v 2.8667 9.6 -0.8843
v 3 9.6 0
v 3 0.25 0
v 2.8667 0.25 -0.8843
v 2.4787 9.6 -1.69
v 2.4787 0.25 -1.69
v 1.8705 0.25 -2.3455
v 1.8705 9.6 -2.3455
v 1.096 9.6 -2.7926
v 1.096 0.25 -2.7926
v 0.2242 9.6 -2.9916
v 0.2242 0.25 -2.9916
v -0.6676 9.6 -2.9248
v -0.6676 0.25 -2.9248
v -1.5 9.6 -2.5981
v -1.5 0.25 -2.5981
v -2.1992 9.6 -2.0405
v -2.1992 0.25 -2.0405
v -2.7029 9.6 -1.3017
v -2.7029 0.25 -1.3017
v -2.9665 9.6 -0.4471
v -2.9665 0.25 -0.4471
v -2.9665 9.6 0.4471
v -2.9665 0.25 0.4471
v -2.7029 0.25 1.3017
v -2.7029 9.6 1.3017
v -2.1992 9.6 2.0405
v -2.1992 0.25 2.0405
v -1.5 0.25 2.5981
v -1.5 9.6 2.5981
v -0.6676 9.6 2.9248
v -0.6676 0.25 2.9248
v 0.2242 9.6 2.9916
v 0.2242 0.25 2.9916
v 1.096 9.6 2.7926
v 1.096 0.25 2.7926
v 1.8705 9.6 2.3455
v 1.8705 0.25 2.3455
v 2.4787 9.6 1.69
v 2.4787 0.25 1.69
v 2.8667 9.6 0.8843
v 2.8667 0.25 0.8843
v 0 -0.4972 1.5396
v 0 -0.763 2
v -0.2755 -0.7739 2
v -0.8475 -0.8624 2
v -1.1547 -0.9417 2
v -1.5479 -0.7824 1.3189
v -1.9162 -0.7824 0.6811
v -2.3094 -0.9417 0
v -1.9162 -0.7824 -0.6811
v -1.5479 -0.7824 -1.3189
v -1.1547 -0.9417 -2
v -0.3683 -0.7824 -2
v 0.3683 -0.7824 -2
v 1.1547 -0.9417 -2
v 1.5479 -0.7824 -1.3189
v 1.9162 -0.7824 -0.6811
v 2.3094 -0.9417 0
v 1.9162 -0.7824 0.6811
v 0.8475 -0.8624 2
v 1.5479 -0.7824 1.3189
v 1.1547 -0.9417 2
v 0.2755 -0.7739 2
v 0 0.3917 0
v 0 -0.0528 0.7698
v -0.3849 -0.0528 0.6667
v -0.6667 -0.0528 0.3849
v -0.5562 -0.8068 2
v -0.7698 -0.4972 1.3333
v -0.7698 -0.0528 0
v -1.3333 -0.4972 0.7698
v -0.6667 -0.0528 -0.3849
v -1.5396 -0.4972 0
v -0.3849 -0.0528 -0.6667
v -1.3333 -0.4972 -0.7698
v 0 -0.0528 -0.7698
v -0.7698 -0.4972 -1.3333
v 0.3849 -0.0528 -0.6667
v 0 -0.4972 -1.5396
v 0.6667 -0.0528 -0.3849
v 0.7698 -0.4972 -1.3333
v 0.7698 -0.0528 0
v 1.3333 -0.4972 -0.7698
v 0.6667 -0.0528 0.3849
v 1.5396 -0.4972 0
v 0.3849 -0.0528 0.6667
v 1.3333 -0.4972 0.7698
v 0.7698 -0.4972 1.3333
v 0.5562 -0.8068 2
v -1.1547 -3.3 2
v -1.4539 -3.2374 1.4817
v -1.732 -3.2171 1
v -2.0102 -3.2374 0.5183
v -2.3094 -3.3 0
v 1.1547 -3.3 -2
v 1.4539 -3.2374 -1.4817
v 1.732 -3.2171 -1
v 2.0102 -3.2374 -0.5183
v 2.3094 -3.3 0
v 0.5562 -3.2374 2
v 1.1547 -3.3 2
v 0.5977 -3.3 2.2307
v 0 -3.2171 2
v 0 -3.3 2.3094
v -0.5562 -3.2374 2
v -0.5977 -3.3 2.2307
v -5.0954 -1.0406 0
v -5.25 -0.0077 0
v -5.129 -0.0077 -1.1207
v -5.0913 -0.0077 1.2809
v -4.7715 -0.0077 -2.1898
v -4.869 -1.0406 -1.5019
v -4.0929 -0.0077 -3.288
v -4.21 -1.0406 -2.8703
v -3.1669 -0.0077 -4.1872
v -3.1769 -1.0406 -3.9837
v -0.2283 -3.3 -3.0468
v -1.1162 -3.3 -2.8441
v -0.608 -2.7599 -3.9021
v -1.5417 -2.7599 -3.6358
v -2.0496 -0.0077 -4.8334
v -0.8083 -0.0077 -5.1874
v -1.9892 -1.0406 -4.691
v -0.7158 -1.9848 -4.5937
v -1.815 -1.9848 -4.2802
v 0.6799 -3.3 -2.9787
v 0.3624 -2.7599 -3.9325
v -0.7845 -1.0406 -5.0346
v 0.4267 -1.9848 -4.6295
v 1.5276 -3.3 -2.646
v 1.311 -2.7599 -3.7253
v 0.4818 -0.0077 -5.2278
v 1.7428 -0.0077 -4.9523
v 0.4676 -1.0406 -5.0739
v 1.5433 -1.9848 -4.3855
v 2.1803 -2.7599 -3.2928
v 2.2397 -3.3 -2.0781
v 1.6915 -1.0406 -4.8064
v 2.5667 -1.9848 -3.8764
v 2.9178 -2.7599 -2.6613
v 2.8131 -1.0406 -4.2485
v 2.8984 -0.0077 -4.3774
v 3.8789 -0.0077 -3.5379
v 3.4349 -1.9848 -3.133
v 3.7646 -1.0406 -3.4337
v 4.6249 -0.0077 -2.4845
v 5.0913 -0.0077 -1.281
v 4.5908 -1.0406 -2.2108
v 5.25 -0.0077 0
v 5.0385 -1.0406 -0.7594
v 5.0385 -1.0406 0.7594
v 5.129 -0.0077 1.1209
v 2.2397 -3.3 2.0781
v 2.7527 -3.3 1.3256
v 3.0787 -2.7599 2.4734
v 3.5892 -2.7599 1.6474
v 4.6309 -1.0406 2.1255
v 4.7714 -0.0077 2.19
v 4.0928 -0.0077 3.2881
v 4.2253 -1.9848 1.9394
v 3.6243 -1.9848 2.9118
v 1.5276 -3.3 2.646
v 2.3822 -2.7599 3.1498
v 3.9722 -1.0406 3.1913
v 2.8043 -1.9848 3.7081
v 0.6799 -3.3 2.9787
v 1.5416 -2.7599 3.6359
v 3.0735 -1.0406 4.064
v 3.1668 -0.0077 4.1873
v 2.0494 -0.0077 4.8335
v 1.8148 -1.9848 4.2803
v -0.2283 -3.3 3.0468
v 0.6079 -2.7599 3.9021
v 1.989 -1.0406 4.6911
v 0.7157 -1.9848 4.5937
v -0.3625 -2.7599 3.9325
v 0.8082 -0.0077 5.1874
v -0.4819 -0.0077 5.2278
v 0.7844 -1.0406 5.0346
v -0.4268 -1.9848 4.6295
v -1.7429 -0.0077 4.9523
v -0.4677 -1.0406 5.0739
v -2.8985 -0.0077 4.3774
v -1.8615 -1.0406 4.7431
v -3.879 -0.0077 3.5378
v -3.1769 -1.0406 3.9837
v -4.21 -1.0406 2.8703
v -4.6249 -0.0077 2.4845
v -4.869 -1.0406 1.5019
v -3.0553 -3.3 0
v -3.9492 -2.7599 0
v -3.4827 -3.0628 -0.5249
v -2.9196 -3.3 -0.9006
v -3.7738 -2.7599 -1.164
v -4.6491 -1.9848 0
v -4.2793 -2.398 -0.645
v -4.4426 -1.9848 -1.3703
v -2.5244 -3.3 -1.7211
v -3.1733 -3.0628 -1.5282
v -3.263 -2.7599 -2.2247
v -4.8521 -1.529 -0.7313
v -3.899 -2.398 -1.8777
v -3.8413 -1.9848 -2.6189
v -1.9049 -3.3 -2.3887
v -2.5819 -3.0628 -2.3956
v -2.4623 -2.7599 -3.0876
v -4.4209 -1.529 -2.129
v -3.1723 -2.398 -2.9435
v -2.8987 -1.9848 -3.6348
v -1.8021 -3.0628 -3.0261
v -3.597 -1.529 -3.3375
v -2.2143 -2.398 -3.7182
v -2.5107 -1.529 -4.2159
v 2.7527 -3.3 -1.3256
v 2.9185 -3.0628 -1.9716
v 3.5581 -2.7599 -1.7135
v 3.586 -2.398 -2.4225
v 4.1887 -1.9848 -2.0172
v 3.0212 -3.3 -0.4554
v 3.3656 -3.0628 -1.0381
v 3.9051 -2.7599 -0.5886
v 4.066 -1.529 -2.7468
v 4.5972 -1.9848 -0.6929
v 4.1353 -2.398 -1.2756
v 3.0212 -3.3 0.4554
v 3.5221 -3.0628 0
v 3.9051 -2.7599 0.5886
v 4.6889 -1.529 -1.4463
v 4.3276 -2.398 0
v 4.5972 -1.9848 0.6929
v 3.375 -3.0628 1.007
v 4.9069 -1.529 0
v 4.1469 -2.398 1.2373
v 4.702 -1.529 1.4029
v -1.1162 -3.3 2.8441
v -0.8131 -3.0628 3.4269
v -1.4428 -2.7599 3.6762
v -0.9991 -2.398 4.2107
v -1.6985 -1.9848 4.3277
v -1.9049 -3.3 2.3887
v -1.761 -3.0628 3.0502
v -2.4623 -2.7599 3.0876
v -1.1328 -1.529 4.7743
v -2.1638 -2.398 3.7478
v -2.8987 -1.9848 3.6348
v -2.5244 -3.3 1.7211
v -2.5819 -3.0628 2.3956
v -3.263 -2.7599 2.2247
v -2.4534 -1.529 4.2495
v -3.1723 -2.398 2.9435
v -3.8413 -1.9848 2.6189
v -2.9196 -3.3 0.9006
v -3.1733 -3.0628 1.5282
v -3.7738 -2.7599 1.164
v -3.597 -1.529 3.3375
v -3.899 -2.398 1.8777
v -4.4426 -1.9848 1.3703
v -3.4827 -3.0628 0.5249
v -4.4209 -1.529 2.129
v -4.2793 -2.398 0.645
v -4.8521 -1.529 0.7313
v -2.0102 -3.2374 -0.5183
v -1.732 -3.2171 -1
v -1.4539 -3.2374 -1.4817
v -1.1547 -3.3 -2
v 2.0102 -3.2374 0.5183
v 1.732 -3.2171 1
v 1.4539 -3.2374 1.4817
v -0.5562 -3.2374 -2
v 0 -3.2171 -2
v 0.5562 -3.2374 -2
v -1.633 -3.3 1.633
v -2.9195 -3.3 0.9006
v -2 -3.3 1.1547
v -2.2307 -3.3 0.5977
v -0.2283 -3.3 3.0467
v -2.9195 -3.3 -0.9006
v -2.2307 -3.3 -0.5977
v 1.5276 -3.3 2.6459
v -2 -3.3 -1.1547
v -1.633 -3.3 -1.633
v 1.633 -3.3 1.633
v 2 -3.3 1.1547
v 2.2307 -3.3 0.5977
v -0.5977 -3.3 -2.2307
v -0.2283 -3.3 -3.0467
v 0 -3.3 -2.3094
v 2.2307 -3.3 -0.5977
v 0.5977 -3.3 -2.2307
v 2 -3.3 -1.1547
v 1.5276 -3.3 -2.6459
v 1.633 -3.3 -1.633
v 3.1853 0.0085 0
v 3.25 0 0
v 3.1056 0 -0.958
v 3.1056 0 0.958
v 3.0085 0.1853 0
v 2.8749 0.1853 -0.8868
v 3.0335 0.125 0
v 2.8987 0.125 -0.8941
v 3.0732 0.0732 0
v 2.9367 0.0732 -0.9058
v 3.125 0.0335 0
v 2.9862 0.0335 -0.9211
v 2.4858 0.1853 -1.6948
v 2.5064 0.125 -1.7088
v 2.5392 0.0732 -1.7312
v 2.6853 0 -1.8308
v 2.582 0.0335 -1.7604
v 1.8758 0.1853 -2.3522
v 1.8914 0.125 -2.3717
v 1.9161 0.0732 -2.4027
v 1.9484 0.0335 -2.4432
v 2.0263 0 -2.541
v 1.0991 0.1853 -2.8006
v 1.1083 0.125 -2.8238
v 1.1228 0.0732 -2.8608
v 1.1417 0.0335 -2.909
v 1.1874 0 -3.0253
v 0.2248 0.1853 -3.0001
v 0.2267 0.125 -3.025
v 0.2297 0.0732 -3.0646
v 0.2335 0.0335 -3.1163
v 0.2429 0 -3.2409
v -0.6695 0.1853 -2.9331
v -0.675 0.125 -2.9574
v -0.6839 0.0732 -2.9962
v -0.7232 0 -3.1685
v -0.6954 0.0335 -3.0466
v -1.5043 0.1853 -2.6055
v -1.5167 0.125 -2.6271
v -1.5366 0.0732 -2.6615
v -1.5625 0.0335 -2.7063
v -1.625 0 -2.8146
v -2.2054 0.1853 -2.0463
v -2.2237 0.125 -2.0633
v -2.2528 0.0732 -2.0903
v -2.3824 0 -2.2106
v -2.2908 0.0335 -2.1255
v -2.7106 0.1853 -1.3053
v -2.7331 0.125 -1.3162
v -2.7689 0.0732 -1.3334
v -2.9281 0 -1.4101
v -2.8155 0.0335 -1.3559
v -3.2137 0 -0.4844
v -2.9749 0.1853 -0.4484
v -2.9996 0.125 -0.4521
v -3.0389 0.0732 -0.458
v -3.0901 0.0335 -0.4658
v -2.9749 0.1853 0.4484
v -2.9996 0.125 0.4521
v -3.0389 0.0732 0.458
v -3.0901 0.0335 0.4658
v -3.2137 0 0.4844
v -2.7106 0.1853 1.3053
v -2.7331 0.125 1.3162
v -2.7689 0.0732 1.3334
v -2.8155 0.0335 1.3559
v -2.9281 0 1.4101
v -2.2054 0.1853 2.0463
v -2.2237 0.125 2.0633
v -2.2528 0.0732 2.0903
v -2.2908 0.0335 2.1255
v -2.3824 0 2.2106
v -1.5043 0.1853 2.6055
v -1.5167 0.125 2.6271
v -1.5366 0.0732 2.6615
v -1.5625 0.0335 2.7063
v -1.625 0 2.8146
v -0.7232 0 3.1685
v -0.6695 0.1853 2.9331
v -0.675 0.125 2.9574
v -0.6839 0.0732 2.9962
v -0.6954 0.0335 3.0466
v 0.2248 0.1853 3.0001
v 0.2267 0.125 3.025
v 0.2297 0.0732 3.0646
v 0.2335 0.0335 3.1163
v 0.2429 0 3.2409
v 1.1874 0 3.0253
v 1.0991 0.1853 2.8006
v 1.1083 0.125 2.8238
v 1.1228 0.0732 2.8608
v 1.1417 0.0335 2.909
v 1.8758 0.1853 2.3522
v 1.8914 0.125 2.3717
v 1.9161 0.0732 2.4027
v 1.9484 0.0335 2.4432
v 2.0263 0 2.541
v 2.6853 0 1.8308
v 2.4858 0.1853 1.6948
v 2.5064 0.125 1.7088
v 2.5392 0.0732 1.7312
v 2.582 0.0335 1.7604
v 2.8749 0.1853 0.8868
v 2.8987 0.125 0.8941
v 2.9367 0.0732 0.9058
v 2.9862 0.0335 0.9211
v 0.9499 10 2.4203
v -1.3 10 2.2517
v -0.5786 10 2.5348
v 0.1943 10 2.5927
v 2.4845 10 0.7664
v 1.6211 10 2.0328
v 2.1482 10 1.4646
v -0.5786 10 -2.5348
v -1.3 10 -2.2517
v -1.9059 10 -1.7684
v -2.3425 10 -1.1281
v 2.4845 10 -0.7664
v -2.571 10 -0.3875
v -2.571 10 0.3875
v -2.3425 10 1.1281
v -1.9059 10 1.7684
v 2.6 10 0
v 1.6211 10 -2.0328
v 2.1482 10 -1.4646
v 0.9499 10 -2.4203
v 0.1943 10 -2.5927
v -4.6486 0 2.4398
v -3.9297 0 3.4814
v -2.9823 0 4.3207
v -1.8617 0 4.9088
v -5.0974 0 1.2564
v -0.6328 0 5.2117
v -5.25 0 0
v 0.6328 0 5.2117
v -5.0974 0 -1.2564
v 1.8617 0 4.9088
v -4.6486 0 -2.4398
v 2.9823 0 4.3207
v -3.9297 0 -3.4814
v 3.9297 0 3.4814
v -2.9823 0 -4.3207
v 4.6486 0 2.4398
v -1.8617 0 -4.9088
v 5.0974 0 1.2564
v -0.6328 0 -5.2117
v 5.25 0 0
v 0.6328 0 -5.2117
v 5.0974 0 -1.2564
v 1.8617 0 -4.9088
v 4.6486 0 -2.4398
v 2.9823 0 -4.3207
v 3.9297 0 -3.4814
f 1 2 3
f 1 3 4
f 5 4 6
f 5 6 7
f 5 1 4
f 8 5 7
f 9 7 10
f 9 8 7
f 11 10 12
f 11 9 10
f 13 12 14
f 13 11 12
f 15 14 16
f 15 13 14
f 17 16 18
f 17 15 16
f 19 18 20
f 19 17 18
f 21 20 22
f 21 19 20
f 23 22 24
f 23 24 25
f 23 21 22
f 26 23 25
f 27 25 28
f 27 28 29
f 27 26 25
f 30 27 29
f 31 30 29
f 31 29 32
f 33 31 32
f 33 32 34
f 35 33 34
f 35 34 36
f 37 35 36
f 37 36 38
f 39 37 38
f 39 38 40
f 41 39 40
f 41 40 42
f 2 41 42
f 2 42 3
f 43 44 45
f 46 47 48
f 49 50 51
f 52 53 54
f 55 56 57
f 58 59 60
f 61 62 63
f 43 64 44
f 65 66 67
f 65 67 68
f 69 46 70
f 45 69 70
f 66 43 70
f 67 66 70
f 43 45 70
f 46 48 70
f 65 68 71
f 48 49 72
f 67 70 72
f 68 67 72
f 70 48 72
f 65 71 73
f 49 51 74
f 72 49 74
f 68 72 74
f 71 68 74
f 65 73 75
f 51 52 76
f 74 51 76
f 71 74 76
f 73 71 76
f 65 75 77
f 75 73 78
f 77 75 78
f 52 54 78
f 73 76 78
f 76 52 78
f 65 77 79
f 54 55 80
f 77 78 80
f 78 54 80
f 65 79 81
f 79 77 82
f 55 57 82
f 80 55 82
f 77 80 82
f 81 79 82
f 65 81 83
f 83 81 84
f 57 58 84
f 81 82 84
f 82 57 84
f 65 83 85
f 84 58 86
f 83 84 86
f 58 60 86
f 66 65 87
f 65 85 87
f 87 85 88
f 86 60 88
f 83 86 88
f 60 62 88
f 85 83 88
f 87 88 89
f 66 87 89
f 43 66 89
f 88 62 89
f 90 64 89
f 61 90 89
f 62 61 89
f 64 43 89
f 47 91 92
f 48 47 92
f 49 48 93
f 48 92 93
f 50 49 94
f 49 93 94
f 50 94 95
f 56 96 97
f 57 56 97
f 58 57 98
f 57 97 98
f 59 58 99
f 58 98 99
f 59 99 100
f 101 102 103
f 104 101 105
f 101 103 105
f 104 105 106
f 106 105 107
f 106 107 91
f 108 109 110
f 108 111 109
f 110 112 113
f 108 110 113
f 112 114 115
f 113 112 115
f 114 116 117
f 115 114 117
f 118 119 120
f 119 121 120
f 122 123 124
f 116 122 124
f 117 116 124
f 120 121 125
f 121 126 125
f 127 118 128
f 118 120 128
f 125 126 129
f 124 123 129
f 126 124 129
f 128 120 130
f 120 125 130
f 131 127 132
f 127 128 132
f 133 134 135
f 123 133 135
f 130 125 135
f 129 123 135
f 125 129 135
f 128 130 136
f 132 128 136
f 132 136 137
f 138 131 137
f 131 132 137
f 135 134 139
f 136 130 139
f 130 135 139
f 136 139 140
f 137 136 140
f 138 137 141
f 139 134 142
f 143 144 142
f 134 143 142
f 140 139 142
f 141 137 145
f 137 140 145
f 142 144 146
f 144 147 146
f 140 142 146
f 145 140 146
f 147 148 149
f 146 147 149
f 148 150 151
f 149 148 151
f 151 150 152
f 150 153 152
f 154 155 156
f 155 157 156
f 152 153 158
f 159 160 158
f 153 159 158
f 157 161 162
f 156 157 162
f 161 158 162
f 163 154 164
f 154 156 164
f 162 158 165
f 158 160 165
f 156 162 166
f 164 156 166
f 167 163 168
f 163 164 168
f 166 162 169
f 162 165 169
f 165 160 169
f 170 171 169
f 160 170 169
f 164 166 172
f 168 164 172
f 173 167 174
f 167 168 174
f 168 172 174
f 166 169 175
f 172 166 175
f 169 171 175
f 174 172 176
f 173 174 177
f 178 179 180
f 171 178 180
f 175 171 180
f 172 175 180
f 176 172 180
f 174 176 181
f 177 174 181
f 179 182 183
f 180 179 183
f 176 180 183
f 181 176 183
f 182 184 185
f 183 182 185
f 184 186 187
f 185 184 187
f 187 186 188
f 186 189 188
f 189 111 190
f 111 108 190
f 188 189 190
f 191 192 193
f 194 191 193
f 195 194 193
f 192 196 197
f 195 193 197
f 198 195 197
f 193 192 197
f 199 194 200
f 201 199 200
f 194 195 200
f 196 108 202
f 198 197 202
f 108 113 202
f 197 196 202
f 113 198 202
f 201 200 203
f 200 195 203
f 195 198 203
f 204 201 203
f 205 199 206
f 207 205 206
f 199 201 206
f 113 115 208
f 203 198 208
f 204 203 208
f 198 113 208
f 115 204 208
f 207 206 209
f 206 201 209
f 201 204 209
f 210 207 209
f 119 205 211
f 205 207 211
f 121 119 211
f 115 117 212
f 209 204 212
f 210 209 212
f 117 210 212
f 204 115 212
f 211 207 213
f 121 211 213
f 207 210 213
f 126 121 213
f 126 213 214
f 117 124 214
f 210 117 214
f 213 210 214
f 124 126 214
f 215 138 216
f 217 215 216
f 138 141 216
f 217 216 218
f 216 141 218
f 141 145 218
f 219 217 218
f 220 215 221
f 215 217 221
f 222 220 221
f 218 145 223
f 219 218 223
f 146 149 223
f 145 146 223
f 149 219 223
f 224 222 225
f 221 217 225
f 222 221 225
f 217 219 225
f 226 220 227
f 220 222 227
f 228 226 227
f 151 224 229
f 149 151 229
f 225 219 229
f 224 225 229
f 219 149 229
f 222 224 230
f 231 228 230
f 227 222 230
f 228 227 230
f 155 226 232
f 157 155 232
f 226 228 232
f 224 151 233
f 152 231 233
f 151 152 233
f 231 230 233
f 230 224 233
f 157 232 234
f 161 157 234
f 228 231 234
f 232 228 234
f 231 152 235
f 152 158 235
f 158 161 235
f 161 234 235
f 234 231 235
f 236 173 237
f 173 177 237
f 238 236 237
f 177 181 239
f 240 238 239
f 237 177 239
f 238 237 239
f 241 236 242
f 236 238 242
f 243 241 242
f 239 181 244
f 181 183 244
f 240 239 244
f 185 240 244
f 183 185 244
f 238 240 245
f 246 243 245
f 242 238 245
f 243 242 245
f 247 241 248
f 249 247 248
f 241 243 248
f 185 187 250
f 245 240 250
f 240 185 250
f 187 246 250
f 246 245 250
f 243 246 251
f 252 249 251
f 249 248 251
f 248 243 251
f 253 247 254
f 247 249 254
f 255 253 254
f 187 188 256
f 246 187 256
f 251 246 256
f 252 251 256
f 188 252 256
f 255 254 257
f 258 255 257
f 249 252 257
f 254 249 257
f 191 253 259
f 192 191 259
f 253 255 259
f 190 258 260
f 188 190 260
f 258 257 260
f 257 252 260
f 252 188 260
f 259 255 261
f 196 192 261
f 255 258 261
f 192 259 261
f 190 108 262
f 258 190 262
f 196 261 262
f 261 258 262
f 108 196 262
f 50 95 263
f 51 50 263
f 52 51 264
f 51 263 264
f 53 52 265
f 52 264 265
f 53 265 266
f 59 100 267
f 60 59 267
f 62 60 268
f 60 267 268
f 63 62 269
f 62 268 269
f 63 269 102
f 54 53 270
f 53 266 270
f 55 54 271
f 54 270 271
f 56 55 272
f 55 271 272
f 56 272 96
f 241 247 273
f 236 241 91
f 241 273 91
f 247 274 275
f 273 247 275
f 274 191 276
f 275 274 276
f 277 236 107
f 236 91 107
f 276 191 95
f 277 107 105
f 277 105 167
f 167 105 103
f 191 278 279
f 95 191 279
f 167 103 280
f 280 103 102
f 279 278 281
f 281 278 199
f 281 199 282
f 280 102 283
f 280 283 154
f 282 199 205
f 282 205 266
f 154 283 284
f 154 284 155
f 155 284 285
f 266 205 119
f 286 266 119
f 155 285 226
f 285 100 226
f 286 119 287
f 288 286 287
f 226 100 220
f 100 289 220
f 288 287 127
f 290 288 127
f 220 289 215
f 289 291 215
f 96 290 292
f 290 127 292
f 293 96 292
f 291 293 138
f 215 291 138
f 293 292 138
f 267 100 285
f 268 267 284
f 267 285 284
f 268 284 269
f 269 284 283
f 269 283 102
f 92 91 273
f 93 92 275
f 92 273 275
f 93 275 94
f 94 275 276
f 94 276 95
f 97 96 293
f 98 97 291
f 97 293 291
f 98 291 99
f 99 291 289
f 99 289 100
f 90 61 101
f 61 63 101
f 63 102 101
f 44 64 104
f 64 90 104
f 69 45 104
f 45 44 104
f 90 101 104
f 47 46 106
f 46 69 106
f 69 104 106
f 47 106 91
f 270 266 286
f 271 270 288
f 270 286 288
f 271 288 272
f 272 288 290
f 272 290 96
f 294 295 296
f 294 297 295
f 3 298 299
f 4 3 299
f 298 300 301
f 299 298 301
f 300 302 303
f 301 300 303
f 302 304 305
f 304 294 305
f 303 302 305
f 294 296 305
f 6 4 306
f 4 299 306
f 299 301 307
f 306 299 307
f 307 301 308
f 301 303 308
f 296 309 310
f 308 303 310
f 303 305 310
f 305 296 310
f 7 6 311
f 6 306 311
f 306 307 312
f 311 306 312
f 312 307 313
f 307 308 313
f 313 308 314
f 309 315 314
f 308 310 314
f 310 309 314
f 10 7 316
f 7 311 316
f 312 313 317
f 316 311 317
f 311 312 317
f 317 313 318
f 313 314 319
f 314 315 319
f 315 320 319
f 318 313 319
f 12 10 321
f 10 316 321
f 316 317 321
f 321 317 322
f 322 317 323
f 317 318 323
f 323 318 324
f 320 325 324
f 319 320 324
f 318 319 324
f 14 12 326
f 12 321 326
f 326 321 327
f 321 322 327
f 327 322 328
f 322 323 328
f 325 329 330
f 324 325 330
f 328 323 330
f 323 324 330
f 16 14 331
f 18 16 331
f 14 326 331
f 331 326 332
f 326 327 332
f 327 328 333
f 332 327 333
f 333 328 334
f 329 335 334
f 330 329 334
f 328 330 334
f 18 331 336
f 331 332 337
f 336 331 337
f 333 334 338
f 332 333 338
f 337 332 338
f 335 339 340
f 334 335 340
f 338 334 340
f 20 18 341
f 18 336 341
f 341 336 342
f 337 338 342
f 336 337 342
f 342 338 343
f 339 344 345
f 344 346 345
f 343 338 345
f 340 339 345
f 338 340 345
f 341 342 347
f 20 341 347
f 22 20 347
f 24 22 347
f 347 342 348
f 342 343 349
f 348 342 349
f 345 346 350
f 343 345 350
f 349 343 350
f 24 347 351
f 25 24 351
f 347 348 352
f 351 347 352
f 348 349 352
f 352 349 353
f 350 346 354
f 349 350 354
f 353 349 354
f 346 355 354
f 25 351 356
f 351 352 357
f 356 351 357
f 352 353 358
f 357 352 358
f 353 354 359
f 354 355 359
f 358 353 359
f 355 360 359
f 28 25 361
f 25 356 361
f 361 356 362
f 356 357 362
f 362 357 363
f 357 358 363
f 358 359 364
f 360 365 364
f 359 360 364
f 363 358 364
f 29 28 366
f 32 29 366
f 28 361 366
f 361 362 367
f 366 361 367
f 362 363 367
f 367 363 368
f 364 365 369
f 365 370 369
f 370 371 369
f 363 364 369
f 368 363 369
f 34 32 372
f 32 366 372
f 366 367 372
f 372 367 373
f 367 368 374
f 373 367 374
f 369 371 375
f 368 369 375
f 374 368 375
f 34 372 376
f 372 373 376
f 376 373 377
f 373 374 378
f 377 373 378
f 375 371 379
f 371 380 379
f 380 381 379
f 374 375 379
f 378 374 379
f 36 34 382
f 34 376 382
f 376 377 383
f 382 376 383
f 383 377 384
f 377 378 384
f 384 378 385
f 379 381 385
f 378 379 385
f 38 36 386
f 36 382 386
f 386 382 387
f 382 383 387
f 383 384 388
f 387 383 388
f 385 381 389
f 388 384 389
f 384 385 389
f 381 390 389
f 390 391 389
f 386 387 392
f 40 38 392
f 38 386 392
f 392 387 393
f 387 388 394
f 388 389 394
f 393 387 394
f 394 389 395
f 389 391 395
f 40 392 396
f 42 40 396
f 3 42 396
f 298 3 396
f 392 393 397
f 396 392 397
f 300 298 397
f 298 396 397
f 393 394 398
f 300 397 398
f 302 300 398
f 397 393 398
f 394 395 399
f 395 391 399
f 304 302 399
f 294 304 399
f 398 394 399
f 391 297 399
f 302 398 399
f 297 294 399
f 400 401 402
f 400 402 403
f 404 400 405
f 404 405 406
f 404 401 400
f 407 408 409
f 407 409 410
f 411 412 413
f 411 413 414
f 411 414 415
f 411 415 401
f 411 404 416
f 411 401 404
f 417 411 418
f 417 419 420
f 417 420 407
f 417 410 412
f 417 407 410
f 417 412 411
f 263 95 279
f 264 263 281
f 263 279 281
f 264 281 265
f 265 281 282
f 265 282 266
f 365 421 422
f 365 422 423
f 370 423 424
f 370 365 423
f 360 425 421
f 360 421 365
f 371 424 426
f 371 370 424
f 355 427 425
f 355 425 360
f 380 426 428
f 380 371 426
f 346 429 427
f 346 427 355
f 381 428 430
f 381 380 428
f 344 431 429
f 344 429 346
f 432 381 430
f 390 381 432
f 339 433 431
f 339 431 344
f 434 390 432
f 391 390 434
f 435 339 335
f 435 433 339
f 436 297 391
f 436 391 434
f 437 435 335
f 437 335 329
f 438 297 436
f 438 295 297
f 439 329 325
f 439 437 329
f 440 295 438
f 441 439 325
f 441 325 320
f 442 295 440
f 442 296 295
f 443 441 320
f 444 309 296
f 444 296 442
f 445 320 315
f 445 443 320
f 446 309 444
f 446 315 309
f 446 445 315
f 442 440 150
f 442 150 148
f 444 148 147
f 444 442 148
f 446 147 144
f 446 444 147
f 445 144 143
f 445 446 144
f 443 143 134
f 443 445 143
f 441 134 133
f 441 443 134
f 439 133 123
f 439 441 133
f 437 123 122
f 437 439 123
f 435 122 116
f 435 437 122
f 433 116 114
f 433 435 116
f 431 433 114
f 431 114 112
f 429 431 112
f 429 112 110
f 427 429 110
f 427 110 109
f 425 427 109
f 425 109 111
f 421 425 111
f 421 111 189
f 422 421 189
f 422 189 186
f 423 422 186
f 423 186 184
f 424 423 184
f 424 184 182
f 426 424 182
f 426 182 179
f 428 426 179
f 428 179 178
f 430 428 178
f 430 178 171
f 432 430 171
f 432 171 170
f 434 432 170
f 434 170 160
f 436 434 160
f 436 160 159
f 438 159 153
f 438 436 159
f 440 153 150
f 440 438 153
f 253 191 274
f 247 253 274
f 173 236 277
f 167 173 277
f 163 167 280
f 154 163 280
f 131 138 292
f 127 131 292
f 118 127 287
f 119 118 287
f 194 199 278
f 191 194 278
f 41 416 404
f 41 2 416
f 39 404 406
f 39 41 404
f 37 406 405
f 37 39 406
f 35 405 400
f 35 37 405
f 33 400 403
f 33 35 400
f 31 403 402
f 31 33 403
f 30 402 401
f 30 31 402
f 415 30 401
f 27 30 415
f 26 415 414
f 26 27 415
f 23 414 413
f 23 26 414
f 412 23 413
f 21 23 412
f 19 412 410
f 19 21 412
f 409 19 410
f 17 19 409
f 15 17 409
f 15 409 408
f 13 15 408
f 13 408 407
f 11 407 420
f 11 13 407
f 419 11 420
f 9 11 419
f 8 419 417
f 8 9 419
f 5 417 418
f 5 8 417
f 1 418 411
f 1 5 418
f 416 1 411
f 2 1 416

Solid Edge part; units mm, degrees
sketch "Sketch1" plane through (0, 0, 0) normal (0, 0, 1) x (1, 0, 0)
  line L0 (3, 0) -> (3, 10)
  line L1 (0, 10) -> (3, 10)
  line L2 (0, 0) -> (0, 10)
  line L3 (0, 0) -> (0, -3.3)
  line L4 (0, -3.3) -> (5.25, -3.3)
  line L5 (5.25, -3.3) -> (5.25, 0)
  line L6 (5.25, 0) -> (3, 0)
revolve "RevolvedProtrusion1" add sketch "Sketch1" angle 360 about axis through (0, 0, 0) along (0, 1, 0)
sketch "Sketch2" plane through (0, 0, 0) normal (1, 0, 0) x (0, 1, 0)
  line L0 (-3.3, 2.7915) -> (-1.22, 2.7915)
  line L1 (0.3917, 0) -> (-1.22, 2.7915)
  line L2 (-3.3, 0) -> (0.3917, 0)
  line L3 (-3.3, 0) -> (-3.3, 2.7915)
revolve "RevolvedCutout1" cut sketch "Sketch2" angle 360 about axis through (0, -3.3, 0) along (0, 1, 0)
sketch "Sketch3" plane through (0, -3.3, 0) normal (0, -1, 0) x (0, 0, 1)
  circle A0 centre (0, 0) radius 2.7915
  line L0 (-2, -1.1547) -> (0, -2.3094)
  line L1 (0, -2.3094) -> (2, -1.1547)
  line L2 (2, -1.1547) -> (2, 1.1547)
  line L3 (2, 1.1547) -> (0, 2.3094)
  line L4 (0, 2.3094) -> (-2, 1.1547)
  line L5 (-2, 1.1547) -> (-2, -1.1547)
  dimension "D1" = 4
extrude "Protrusion1" add sketch "Sketch3" against normal up to next
sketch "Sketch4" plane through (0, 0, 0) normal (0, 0, 1) x (1, 0, 0)
  line L0 (-2.3094, -3.3) -> (0, -3.3)
  line L1 (0, -3.3) -> (0, -2.6812)
  line L2 (0, -2.6812) -> (-2.3094, -3.3)
revolve "RevolvedCutout2" cut sketch "Sketch4" angle 360 about axis through (0, -3.3, 0) along (0, 1, 0)
fillet "Round1" radius 0.25 1 edges at (0, 0, -3)
chamfer "倒斜角_2" distance 0.4 angle 45 1 edges at (0, 10, -3)
cosmetic_thread "螺纹_3" size "M6" thread depth 8
sketch "Sketch5" plane through (0, 0, 0) normal (0, 0, 1) x (1, 0, 0)
  arc A0 (-3.0553, -3.3) -> (-5.25, 0) centre (-1.6717, 0) cw
revolve "RevolvedCutout3" cut sketch "Sketch5" angle 360 about axis through (0, 0, 0) along (0, -1, 0) material side at (-4.6929, -2.0093, 0)
